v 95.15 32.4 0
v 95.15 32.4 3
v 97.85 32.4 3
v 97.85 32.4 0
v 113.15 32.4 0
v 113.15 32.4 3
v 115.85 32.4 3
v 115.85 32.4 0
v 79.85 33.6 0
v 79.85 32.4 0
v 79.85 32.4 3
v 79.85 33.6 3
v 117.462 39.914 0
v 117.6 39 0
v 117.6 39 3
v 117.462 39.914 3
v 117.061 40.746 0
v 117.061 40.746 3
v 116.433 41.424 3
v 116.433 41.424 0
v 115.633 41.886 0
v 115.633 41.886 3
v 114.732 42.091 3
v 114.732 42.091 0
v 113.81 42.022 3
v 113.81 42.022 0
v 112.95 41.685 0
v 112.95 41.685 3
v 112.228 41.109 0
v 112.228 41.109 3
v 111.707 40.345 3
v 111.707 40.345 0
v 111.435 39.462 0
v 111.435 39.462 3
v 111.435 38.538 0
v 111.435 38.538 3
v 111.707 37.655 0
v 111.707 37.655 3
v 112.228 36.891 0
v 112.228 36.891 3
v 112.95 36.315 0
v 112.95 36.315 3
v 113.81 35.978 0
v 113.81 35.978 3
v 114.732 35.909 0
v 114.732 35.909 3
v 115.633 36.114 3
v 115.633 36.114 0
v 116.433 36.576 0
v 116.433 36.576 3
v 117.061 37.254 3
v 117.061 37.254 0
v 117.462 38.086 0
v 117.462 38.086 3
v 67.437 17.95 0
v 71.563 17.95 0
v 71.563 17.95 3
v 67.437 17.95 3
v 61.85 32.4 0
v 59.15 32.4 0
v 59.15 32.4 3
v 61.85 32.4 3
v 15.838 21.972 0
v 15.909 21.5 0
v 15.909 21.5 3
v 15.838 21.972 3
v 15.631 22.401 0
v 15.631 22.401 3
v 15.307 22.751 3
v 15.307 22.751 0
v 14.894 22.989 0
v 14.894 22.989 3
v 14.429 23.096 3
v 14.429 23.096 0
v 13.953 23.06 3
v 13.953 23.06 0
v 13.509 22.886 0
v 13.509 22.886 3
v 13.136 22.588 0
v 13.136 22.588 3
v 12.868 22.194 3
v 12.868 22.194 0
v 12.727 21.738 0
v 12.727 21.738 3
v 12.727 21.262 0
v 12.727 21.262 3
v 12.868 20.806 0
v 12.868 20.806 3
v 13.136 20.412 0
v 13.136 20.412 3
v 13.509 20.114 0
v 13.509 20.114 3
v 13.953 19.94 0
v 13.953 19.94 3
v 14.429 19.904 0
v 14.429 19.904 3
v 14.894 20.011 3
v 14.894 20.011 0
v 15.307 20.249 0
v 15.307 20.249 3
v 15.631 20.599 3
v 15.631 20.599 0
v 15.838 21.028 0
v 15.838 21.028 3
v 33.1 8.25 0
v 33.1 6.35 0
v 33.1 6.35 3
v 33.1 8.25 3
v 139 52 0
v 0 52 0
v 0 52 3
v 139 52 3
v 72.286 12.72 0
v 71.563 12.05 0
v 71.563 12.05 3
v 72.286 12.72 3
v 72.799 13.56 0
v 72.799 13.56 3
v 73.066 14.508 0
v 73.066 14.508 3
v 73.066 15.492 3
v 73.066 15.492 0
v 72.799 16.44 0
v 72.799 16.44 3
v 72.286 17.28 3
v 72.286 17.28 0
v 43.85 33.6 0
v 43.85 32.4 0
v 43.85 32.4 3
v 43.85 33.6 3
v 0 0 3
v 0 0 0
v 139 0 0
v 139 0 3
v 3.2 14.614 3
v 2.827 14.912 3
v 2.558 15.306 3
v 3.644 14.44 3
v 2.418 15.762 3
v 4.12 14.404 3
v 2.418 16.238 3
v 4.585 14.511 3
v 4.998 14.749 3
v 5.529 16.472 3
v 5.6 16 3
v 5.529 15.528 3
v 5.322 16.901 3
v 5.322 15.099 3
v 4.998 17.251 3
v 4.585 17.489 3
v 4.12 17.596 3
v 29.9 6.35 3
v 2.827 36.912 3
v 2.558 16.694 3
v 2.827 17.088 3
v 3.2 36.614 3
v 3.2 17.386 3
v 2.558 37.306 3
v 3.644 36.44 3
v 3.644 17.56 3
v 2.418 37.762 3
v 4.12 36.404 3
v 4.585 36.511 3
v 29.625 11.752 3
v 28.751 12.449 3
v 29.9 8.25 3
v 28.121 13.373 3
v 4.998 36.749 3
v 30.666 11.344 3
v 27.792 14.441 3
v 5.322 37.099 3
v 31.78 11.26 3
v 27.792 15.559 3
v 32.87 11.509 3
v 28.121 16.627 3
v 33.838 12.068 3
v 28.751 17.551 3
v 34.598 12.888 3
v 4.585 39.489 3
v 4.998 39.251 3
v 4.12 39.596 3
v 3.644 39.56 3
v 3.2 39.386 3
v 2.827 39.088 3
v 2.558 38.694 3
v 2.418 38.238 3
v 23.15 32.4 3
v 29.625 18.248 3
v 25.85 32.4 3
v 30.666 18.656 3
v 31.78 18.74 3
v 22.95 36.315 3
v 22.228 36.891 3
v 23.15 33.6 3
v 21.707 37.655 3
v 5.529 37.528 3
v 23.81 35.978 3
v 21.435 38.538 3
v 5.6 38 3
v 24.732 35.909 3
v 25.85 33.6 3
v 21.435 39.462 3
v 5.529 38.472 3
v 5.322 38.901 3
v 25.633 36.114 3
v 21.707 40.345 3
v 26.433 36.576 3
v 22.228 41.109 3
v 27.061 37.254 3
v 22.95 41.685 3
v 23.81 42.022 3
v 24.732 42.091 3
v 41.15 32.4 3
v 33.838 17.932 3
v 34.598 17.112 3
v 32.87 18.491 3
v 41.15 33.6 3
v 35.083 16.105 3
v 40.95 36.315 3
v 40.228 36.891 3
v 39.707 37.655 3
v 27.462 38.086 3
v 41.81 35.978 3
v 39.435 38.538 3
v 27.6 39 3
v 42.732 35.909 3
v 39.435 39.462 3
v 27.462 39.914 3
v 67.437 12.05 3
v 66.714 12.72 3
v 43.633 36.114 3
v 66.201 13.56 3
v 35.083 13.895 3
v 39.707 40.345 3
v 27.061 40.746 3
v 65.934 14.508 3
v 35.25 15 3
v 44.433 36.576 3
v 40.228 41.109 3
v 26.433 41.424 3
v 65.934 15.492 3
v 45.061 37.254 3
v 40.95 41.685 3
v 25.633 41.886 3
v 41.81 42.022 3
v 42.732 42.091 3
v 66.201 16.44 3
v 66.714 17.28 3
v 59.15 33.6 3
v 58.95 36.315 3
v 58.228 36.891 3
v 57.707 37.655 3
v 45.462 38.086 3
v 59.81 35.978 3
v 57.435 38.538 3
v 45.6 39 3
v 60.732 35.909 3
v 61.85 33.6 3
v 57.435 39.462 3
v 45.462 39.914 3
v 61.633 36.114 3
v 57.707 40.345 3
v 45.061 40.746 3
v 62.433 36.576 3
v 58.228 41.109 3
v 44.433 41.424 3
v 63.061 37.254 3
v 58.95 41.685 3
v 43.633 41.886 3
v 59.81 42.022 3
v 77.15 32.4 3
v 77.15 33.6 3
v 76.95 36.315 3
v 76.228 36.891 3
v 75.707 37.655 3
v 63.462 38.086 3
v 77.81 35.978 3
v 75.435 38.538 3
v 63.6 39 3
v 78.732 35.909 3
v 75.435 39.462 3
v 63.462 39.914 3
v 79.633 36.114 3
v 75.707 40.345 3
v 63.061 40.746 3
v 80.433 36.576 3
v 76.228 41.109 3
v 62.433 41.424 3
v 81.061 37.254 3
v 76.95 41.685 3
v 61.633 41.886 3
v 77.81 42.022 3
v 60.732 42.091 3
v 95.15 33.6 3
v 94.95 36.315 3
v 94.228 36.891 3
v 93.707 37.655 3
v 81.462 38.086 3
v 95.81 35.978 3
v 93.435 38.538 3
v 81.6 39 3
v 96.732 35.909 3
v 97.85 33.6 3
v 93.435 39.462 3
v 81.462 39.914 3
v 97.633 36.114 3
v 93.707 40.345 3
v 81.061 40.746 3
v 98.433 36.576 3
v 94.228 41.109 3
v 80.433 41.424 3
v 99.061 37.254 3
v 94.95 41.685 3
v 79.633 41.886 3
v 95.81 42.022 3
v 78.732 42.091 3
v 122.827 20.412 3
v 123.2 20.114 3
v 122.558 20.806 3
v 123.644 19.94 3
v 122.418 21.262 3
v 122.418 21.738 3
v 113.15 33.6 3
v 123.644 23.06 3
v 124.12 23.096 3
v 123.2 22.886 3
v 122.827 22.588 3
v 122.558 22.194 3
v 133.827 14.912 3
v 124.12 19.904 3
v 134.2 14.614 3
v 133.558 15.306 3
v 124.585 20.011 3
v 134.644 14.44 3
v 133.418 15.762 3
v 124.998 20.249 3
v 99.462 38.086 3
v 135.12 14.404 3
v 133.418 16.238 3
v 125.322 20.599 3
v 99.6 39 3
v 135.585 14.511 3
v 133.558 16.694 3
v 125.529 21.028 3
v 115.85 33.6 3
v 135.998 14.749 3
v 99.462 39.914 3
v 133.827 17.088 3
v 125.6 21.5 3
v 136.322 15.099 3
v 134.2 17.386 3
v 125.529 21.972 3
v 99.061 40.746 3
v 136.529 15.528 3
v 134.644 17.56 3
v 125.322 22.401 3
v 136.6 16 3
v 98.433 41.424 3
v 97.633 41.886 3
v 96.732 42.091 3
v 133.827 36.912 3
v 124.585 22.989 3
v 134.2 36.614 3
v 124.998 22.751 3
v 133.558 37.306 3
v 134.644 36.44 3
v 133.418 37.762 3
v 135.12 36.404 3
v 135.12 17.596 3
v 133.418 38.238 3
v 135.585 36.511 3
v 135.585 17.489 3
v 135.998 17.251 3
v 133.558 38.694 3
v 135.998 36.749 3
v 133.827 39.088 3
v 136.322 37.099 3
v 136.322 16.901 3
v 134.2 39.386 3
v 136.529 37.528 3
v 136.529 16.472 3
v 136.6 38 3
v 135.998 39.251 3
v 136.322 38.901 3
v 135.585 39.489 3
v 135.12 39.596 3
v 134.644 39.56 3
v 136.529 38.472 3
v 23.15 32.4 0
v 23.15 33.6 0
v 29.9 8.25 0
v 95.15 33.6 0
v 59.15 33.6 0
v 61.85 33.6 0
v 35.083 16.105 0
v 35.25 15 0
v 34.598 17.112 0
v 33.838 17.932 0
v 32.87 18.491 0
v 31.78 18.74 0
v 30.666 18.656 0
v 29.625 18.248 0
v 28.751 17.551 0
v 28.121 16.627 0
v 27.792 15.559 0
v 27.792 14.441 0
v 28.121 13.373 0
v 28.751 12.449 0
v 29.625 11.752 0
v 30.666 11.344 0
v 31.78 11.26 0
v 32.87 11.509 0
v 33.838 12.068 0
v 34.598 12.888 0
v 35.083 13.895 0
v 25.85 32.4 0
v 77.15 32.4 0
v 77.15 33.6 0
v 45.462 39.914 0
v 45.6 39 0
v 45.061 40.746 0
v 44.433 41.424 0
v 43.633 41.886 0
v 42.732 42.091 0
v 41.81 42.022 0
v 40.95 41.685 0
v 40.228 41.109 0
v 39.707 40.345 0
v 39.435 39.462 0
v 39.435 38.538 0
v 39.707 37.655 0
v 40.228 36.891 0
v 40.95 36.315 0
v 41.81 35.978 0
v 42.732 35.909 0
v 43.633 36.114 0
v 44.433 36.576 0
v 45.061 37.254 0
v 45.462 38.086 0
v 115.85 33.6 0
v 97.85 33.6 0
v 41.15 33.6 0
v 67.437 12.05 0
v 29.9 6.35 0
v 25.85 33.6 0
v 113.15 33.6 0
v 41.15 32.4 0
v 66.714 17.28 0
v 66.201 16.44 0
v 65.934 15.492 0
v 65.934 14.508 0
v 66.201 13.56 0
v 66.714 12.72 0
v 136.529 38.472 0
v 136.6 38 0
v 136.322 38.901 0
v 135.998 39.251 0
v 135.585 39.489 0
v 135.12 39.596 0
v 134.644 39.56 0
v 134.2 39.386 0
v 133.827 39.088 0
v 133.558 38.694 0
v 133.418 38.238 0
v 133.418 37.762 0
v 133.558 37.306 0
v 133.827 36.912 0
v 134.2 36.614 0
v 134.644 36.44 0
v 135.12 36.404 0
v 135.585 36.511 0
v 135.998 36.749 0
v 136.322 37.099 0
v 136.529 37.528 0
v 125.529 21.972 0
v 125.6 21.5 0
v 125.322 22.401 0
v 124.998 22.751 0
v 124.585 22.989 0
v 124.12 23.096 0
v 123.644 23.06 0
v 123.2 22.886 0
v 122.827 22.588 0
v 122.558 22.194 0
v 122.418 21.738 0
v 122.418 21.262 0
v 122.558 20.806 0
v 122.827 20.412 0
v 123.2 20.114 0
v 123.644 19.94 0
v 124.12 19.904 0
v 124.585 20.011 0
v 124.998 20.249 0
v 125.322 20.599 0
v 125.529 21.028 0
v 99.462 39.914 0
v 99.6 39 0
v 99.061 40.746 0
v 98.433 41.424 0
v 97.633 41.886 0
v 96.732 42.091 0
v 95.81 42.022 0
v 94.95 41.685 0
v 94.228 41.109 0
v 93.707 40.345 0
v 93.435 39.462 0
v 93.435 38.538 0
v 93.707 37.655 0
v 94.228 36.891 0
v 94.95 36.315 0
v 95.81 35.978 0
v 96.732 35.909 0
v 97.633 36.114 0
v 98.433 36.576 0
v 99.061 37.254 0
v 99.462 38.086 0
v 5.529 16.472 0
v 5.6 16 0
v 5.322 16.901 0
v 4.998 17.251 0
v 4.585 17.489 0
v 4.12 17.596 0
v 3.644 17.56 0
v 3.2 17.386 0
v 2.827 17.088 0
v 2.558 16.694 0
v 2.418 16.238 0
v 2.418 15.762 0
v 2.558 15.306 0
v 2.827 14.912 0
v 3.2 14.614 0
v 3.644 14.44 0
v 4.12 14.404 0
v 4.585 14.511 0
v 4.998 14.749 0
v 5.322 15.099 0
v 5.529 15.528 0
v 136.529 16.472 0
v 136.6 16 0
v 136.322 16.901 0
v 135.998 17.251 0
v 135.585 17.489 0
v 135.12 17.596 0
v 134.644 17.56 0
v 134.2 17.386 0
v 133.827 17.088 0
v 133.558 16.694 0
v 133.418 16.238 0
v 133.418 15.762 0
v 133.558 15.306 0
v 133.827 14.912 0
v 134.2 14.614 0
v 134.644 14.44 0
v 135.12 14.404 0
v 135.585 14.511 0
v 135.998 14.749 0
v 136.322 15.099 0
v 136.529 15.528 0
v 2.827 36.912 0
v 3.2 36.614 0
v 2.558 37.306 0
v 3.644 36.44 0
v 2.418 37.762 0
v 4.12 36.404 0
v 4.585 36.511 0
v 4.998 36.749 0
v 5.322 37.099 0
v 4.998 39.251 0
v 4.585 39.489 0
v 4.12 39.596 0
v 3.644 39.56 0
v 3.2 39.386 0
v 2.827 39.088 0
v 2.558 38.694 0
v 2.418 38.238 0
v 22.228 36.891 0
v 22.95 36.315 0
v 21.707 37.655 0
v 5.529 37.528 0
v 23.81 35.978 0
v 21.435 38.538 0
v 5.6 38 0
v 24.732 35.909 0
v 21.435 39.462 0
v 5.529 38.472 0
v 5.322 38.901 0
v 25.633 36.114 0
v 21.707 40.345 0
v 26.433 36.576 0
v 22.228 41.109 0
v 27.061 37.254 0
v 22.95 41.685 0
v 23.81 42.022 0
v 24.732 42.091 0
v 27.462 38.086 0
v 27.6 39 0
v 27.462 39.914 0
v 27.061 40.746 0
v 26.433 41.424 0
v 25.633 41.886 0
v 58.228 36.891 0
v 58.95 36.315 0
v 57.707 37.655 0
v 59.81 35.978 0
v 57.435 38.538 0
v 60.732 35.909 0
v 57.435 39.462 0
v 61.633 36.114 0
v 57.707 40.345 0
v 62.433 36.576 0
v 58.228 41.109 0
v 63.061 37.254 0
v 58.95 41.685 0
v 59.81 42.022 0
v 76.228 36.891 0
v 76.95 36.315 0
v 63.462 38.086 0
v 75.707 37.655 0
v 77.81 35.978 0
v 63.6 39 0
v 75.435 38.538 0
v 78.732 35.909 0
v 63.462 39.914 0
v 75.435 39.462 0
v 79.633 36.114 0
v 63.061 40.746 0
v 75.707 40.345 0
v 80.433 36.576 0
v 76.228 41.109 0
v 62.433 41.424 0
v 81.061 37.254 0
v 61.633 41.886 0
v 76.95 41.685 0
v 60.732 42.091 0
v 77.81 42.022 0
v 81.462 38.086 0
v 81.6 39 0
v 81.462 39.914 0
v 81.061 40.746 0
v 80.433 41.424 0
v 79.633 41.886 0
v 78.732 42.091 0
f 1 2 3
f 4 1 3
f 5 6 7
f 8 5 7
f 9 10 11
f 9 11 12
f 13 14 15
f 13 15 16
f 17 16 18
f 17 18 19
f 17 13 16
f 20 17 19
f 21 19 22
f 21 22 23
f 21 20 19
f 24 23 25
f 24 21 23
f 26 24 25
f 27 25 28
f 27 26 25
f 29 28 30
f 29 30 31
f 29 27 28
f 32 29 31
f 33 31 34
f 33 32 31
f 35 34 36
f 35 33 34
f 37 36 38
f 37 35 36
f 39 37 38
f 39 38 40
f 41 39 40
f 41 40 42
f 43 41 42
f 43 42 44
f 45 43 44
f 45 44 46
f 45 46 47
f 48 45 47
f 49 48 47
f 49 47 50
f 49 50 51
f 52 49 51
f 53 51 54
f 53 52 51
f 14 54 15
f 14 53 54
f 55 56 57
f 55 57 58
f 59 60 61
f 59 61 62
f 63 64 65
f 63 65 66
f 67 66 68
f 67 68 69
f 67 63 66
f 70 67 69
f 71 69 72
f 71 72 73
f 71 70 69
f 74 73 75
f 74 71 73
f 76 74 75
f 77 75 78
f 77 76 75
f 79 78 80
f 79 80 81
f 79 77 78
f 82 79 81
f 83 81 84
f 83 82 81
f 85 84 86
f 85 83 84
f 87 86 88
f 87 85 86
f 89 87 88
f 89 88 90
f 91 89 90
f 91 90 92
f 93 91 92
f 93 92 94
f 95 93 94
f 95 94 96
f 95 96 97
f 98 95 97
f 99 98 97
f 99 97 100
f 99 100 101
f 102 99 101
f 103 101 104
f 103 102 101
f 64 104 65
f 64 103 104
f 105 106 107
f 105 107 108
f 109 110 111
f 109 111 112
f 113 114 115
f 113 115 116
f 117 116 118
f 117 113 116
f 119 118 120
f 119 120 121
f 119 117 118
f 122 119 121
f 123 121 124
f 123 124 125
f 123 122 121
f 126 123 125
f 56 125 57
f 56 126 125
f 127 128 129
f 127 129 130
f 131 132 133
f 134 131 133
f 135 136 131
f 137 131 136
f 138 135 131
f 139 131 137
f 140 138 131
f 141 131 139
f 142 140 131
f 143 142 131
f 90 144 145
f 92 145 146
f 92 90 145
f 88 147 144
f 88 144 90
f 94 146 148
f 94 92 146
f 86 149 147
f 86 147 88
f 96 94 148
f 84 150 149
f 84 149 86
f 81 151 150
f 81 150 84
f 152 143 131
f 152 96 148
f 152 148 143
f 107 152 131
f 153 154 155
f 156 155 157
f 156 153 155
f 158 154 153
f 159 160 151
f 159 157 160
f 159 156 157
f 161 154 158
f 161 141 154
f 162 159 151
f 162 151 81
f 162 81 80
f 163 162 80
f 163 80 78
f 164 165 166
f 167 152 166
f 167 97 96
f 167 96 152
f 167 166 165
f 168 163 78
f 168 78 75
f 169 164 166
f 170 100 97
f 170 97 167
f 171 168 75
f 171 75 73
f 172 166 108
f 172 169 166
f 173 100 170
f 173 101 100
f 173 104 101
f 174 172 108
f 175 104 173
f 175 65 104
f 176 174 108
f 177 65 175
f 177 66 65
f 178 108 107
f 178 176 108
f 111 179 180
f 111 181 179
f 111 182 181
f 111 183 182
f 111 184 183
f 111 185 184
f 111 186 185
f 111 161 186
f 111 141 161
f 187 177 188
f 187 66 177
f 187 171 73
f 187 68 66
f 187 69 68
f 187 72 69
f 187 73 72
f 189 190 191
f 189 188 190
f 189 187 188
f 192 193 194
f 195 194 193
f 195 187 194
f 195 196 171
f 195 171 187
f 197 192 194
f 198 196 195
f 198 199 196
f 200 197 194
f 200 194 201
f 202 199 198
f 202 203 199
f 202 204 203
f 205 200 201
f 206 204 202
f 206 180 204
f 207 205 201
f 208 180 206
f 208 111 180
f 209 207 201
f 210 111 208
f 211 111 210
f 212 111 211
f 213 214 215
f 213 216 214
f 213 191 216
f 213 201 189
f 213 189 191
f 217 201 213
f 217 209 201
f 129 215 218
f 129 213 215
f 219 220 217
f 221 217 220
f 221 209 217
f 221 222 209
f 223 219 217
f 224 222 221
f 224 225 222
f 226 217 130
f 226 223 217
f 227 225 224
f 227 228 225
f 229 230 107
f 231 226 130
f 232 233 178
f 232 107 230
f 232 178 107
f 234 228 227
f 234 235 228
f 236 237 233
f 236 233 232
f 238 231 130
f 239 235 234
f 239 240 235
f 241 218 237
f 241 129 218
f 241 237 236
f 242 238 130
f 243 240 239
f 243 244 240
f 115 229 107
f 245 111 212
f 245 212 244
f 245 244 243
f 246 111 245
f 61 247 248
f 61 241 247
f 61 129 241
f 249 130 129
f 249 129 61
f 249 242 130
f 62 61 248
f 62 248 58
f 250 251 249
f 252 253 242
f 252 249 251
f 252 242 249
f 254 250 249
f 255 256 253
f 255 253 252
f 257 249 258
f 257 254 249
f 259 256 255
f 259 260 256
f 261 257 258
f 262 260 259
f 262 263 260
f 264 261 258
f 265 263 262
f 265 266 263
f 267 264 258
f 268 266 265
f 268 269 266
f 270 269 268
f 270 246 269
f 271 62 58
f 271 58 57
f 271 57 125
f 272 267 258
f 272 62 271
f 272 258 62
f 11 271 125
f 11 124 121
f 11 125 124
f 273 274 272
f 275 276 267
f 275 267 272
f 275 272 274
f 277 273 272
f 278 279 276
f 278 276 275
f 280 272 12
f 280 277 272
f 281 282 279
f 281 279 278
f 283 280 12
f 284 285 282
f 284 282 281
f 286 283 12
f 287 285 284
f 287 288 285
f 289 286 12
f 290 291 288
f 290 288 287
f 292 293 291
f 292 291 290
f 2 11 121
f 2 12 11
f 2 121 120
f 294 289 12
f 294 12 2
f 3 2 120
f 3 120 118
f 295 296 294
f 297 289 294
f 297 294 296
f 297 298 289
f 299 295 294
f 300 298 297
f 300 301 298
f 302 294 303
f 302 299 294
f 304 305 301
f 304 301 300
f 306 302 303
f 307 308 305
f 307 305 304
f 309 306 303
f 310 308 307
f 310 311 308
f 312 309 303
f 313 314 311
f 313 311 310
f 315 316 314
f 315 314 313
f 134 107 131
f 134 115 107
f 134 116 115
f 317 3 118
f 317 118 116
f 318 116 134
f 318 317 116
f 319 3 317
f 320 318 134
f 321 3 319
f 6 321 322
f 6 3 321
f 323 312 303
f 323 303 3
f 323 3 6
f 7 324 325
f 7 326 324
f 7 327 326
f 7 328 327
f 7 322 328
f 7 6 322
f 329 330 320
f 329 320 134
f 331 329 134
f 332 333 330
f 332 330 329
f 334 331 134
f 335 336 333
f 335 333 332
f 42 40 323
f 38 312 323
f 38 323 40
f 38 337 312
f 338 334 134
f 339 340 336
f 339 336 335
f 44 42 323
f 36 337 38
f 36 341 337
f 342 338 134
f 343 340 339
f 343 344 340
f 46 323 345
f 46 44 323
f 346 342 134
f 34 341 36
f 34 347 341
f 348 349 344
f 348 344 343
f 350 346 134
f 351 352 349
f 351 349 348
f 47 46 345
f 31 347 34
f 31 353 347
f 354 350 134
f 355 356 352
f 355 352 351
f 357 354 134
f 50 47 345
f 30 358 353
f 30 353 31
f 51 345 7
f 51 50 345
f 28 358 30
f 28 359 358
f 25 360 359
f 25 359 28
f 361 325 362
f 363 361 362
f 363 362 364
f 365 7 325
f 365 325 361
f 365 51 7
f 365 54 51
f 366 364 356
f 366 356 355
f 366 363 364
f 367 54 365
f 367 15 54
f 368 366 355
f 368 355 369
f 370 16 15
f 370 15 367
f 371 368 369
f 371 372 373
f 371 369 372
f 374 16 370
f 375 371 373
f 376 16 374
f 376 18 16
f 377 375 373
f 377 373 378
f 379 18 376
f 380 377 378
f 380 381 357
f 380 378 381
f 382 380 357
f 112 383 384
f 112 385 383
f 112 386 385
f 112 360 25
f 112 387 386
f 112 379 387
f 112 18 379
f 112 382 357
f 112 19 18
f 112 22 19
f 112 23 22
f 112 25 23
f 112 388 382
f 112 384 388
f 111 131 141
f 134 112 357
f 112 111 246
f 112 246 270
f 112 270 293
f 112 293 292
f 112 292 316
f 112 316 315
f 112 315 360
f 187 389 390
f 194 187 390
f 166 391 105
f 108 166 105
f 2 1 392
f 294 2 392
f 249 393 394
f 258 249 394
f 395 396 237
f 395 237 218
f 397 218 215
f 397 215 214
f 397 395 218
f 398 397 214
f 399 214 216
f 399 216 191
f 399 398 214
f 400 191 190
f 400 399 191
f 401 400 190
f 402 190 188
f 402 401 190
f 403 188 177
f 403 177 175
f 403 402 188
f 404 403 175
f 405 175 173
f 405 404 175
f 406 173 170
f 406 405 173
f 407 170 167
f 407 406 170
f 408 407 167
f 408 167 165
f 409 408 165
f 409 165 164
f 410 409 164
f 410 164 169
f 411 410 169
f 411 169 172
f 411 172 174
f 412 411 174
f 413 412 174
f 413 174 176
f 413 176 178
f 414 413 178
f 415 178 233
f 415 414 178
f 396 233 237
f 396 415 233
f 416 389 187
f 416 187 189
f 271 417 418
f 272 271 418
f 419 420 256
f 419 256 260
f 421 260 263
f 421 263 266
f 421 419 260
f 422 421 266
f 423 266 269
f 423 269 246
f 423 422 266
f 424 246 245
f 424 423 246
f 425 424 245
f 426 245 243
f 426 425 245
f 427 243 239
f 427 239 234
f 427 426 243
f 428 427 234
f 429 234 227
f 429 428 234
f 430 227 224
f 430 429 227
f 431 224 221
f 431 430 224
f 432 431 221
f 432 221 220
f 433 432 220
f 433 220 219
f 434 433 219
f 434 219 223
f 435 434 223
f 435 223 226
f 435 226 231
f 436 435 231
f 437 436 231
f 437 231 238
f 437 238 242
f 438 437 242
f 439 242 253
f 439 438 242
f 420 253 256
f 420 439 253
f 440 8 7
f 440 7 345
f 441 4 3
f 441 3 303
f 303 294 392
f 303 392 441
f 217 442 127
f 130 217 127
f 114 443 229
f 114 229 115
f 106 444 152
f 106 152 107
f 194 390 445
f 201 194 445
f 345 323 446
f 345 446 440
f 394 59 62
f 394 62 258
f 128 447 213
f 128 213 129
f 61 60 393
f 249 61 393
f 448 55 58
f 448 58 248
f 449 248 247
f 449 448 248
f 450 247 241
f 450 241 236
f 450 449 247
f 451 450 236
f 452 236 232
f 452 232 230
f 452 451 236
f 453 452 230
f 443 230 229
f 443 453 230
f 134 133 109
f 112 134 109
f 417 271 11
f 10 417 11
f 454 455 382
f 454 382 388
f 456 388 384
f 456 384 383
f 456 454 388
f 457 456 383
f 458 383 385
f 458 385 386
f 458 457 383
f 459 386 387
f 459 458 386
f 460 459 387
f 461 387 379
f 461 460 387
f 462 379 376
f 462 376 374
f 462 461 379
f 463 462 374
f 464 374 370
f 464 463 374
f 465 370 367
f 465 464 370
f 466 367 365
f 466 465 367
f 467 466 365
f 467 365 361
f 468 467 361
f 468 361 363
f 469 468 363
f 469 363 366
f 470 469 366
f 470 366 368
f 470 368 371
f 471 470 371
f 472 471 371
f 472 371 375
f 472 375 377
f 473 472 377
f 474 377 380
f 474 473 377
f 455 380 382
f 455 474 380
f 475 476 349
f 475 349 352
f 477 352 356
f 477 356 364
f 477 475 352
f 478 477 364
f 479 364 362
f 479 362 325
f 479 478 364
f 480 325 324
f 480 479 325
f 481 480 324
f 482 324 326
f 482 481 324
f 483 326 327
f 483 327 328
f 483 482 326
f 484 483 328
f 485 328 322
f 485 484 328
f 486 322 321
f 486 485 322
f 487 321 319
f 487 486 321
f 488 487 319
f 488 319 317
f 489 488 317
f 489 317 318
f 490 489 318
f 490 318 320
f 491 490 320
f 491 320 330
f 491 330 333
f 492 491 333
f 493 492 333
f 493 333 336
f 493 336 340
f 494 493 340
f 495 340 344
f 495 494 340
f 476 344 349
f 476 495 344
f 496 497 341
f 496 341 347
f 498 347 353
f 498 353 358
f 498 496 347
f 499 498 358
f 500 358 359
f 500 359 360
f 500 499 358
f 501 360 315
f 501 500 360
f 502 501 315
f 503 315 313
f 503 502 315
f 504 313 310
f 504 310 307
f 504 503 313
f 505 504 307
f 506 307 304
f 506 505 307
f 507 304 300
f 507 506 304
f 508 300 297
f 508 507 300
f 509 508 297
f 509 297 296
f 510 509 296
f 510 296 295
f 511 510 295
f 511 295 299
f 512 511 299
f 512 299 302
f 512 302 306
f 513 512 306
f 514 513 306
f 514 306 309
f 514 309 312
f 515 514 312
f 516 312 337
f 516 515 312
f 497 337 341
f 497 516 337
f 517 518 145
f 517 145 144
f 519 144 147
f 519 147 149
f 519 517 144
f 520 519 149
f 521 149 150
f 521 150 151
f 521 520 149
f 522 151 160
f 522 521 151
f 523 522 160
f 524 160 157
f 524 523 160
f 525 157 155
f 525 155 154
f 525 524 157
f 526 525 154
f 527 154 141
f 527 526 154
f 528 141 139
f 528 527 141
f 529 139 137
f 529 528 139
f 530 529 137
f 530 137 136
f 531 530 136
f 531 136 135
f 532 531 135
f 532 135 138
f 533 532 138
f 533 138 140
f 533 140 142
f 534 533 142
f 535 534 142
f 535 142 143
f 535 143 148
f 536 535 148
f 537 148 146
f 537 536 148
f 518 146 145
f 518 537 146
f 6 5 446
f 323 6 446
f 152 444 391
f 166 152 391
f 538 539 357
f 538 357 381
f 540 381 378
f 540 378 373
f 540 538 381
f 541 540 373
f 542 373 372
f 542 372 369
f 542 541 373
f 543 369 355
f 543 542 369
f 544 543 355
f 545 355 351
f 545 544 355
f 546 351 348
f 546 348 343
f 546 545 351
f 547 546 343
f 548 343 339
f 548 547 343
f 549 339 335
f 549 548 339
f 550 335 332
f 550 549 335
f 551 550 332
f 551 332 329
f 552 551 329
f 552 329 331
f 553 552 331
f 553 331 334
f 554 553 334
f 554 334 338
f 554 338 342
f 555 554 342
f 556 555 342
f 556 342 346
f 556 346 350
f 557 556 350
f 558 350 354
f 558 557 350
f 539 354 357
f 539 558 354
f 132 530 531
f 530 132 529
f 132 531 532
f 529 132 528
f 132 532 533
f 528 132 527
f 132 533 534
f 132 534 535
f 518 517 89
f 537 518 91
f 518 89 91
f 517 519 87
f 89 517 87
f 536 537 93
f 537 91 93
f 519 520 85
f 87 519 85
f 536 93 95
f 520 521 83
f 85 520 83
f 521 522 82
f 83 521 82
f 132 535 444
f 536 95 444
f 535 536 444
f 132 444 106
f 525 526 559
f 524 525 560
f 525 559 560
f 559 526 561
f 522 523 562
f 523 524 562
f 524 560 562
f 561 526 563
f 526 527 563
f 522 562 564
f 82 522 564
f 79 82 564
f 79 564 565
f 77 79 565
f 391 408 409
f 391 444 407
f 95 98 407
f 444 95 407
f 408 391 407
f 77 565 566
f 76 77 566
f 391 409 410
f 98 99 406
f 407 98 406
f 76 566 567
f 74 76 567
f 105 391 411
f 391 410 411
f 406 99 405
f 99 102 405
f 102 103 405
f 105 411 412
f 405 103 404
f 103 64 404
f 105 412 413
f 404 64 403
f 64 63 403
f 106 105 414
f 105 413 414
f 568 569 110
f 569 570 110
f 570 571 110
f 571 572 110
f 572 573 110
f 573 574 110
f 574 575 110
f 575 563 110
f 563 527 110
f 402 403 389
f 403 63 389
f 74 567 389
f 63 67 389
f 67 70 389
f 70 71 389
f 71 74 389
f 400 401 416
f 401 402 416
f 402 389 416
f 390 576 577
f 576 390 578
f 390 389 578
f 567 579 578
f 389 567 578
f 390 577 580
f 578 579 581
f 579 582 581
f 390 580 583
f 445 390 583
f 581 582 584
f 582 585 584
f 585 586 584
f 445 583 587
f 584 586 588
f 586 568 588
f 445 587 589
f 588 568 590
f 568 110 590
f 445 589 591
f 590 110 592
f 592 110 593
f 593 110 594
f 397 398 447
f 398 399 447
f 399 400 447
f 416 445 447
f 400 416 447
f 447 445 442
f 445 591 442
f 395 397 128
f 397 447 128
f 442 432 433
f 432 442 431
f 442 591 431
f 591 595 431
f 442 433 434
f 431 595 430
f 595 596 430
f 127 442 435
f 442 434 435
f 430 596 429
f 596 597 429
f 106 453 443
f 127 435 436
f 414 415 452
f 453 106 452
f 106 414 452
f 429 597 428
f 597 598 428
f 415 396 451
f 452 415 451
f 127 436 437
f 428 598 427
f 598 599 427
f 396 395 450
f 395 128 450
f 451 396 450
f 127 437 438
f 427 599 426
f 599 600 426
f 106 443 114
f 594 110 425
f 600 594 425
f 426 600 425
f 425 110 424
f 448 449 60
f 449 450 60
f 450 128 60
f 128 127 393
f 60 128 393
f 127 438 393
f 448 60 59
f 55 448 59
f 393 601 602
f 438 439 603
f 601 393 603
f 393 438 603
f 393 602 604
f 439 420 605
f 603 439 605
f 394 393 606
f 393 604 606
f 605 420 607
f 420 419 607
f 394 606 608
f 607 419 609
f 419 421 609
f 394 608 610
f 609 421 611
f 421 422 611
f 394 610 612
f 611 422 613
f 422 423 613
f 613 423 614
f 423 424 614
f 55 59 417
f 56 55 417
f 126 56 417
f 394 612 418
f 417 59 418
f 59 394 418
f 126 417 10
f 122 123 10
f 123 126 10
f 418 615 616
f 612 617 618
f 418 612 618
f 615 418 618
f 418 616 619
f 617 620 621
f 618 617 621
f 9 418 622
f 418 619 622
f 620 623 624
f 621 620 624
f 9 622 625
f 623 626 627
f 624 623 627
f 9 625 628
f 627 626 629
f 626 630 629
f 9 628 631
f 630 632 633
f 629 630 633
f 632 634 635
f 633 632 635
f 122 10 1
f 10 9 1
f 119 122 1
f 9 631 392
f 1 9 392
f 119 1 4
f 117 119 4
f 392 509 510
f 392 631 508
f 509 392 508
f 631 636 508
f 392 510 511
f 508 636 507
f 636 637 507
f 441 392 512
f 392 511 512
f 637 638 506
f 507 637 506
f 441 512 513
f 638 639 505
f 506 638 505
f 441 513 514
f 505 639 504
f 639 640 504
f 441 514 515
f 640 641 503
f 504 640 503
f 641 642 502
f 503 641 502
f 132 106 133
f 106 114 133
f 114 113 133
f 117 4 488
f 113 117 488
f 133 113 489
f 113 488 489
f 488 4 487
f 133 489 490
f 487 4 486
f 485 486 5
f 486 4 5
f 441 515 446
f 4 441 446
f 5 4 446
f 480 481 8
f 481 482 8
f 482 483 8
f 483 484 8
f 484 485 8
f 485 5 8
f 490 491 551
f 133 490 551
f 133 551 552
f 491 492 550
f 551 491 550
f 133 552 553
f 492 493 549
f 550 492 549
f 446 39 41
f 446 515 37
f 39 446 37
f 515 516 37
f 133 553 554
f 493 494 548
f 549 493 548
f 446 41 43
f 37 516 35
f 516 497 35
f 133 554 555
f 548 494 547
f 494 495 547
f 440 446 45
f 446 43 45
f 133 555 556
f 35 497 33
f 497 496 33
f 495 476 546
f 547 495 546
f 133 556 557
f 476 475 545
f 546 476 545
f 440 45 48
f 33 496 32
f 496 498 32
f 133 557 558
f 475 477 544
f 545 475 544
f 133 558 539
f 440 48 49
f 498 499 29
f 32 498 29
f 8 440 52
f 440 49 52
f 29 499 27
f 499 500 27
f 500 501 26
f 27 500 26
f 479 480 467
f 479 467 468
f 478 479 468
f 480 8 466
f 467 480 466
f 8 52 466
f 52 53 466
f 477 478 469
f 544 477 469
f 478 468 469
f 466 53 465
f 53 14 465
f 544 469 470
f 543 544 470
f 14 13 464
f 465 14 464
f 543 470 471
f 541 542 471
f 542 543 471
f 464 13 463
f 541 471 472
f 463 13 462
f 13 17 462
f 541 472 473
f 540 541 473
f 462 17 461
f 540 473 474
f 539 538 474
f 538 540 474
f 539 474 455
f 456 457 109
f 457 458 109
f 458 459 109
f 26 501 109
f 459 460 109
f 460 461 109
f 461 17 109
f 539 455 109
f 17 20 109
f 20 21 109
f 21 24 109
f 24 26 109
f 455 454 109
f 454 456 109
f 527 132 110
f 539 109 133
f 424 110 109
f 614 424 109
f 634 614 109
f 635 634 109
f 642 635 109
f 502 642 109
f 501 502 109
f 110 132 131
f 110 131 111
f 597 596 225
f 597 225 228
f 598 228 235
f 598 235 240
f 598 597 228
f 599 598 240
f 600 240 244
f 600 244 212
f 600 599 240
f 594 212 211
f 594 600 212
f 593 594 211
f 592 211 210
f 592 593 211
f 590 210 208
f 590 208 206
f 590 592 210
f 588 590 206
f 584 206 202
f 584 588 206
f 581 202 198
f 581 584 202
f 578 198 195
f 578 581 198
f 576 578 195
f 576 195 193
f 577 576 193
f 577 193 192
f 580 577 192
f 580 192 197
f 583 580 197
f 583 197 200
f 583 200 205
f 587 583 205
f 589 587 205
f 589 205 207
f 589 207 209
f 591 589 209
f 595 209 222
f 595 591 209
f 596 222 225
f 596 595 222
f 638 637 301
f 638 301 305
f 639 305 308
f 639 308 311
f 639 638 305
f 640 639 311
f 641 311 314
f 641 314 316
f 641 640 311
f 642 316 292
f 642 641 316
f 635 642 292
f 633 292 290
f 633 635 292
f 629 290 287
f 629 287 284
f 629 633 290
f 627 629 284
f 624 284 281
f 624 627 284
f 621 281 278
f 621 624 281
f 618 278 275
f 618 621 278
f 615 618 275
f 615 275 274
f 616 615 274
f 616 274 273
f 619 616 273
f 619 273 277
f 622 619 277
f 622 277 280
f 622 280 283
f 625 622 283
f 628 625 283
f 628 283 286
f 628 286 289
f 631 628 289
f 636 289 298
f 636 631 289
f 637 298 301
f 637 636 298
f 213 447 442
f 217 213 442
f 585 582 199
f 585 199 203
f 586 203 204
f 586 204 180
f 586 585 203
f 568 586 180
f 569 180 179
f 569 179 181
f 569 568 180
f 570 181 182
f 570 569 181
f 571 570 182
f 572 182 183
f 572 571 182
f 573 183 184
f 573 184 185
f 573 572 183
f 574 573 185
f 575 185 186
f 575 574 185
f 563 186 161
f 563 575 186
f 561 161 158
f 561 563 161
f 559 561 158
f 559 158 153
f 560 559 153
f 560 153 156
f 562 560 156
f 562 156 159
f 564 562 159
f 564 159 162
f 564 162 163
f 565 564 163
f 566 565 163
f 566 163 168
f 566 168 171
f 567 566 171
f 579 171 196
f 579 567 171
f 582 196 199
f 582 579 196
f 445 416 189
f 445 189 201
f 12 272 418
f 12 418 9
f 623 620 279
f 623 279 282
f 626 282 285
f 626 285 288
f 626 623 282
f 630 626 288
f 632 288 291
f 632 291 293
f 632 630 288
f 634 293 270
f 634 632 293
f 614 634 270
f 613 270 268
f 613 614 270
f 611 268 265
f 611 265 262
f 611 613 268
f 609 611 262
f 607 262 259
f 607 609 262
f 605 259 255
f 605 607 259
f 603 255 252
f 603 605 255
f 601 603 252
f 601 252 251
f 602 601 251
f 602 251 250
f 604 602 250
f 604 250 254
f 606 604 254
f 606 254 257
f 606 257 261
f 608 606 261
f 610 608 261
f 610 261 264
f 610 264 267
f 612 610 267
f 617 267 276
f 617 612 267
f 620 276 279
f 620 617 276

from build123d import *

# Parameters (mm, degrees)
SKETCH1_W           = 139
SKETCH1_H           = 52
SKETCH1_R           = 3.1
SKETCH1_R_2         = 1.6
SKETCH1_R_3         = 3.75
SKETCH1_W_2         = 3.2
SKETCH1_H_2         = 1.9
SKETCH1_W_3         = 2.7
SKETCH1_H_3         = 1.2
BOSS_EXTRUDE1_DEPTH = 3


with BuildPart() as part:
    # Sketch1 → Boss-Extrude1 (new body)
    with BuildSketch(Plane.XY):
        with Locations((69.5, 26)):
            Rectangle(SKETCH1_W, SKETCH1_H)
        with Locations((24.5, 39)):
            Circle(SKETCH1_R, mode=Mode.SUBTRACT)
        with Locations((4, 38)):
            Circle(SKETCH1_R_2, mode=Mode.SUBTRACT)
        with Locations((135, 38)):
            Circle(SKETCH1_R_2, mode=Mode.SUBTRACT)
        with Locations((135, 16)):
            Circle(SKETCH1_R_2, mode=Mode.SUBTRACT)
        with Locations((4, 16)):
            Circle(SKETCH1_R_2, mode=Mode.SUBTRACT)
        with Locations((14.309088021, 21.5)):
            Circle(SKETCH1_R_2, mode=Mode.SUBTRACT)
        with Locations((124, 21.5)):
            Circle(SKETCH1_R_2, mode=Mode.SUBTRACT)
        with Locations((42.5, 39)):
            Circle(SKETCH1_R, mode=Mode.SUBTRACT)
        with Locations((60.5, 39)):
            Circle(SKETCH1_R, mode=Mode.SUBTRACT)
        with Locations((78.5, 39)):
            Circle(SKETCH1_R, mode=Mode.SUBTRACT)
        with Locations((96.5, 39)):
            Circle(SKETCH1_R, mode=Mode.SUBTRACT)
        with Locations((114.5, 39)):
            Circle(SKETCH1_R, mode=Mode.SUBTRACT)
        with Locations((31.5, 15)):
            Circle(SKETCH1_R_3, mode=Mode.SUBTRACT)
        with Locations((31.5, 7.3)):
            Rectangle(SKETCH1_W_2, SKETCH1_H_2, mode=Mode.SUBTRACT)
        with Locations((24.5, 33)):
            Rectangle(SKETCH1_W_3, SKETCH1_H_3, mode=Mode.SUBTRACT)
        with Locations((42.5, 33)):
            Rectangle(SKETCH1_W_3, SKETCH1_H_3, mode=Mode.SUBTRACT)
        with Locations((60.5, 33)):
            Rectangle(SKETCH1_W_3, SKETCH1_H_3, mode=Mode.SUBTRACT)
        with Locations((78.5, 33)):
            Rectangle(SKETCH1_W_3, SKETCH1_H_3, mode=Mode.SUBTRACT)
        with Locations((96.5, 33)):
            Rectangle(SKETCH1_W_3, SKETCH1_H_3, mode=Mode.SUBTRACT)
        with Locations((114.5, 33)):
            Rectangle(SKETCH1_W_3, SKETCH1_H_3, mode=Mode.SUBTRACT)
        with BuildLine():
            Line((67.436628972, 12.05), (71.563371028, 12.05))
            ThreePointArc((71.563371028, 12.05), (73.1, 15), (71.563371028, 17.95))
            Line((71.563371028, 17.95), (67.436628972, 17.95))
            ThreePointArc((67.436628972, 17.95), (65.9, 15), (67.436628972, 12.05))
        make_face(mode=Mode.SUBTRACT)
    extrude(amount=BOSS_EXTRUDE1_DEPTH)


solid = part.part
